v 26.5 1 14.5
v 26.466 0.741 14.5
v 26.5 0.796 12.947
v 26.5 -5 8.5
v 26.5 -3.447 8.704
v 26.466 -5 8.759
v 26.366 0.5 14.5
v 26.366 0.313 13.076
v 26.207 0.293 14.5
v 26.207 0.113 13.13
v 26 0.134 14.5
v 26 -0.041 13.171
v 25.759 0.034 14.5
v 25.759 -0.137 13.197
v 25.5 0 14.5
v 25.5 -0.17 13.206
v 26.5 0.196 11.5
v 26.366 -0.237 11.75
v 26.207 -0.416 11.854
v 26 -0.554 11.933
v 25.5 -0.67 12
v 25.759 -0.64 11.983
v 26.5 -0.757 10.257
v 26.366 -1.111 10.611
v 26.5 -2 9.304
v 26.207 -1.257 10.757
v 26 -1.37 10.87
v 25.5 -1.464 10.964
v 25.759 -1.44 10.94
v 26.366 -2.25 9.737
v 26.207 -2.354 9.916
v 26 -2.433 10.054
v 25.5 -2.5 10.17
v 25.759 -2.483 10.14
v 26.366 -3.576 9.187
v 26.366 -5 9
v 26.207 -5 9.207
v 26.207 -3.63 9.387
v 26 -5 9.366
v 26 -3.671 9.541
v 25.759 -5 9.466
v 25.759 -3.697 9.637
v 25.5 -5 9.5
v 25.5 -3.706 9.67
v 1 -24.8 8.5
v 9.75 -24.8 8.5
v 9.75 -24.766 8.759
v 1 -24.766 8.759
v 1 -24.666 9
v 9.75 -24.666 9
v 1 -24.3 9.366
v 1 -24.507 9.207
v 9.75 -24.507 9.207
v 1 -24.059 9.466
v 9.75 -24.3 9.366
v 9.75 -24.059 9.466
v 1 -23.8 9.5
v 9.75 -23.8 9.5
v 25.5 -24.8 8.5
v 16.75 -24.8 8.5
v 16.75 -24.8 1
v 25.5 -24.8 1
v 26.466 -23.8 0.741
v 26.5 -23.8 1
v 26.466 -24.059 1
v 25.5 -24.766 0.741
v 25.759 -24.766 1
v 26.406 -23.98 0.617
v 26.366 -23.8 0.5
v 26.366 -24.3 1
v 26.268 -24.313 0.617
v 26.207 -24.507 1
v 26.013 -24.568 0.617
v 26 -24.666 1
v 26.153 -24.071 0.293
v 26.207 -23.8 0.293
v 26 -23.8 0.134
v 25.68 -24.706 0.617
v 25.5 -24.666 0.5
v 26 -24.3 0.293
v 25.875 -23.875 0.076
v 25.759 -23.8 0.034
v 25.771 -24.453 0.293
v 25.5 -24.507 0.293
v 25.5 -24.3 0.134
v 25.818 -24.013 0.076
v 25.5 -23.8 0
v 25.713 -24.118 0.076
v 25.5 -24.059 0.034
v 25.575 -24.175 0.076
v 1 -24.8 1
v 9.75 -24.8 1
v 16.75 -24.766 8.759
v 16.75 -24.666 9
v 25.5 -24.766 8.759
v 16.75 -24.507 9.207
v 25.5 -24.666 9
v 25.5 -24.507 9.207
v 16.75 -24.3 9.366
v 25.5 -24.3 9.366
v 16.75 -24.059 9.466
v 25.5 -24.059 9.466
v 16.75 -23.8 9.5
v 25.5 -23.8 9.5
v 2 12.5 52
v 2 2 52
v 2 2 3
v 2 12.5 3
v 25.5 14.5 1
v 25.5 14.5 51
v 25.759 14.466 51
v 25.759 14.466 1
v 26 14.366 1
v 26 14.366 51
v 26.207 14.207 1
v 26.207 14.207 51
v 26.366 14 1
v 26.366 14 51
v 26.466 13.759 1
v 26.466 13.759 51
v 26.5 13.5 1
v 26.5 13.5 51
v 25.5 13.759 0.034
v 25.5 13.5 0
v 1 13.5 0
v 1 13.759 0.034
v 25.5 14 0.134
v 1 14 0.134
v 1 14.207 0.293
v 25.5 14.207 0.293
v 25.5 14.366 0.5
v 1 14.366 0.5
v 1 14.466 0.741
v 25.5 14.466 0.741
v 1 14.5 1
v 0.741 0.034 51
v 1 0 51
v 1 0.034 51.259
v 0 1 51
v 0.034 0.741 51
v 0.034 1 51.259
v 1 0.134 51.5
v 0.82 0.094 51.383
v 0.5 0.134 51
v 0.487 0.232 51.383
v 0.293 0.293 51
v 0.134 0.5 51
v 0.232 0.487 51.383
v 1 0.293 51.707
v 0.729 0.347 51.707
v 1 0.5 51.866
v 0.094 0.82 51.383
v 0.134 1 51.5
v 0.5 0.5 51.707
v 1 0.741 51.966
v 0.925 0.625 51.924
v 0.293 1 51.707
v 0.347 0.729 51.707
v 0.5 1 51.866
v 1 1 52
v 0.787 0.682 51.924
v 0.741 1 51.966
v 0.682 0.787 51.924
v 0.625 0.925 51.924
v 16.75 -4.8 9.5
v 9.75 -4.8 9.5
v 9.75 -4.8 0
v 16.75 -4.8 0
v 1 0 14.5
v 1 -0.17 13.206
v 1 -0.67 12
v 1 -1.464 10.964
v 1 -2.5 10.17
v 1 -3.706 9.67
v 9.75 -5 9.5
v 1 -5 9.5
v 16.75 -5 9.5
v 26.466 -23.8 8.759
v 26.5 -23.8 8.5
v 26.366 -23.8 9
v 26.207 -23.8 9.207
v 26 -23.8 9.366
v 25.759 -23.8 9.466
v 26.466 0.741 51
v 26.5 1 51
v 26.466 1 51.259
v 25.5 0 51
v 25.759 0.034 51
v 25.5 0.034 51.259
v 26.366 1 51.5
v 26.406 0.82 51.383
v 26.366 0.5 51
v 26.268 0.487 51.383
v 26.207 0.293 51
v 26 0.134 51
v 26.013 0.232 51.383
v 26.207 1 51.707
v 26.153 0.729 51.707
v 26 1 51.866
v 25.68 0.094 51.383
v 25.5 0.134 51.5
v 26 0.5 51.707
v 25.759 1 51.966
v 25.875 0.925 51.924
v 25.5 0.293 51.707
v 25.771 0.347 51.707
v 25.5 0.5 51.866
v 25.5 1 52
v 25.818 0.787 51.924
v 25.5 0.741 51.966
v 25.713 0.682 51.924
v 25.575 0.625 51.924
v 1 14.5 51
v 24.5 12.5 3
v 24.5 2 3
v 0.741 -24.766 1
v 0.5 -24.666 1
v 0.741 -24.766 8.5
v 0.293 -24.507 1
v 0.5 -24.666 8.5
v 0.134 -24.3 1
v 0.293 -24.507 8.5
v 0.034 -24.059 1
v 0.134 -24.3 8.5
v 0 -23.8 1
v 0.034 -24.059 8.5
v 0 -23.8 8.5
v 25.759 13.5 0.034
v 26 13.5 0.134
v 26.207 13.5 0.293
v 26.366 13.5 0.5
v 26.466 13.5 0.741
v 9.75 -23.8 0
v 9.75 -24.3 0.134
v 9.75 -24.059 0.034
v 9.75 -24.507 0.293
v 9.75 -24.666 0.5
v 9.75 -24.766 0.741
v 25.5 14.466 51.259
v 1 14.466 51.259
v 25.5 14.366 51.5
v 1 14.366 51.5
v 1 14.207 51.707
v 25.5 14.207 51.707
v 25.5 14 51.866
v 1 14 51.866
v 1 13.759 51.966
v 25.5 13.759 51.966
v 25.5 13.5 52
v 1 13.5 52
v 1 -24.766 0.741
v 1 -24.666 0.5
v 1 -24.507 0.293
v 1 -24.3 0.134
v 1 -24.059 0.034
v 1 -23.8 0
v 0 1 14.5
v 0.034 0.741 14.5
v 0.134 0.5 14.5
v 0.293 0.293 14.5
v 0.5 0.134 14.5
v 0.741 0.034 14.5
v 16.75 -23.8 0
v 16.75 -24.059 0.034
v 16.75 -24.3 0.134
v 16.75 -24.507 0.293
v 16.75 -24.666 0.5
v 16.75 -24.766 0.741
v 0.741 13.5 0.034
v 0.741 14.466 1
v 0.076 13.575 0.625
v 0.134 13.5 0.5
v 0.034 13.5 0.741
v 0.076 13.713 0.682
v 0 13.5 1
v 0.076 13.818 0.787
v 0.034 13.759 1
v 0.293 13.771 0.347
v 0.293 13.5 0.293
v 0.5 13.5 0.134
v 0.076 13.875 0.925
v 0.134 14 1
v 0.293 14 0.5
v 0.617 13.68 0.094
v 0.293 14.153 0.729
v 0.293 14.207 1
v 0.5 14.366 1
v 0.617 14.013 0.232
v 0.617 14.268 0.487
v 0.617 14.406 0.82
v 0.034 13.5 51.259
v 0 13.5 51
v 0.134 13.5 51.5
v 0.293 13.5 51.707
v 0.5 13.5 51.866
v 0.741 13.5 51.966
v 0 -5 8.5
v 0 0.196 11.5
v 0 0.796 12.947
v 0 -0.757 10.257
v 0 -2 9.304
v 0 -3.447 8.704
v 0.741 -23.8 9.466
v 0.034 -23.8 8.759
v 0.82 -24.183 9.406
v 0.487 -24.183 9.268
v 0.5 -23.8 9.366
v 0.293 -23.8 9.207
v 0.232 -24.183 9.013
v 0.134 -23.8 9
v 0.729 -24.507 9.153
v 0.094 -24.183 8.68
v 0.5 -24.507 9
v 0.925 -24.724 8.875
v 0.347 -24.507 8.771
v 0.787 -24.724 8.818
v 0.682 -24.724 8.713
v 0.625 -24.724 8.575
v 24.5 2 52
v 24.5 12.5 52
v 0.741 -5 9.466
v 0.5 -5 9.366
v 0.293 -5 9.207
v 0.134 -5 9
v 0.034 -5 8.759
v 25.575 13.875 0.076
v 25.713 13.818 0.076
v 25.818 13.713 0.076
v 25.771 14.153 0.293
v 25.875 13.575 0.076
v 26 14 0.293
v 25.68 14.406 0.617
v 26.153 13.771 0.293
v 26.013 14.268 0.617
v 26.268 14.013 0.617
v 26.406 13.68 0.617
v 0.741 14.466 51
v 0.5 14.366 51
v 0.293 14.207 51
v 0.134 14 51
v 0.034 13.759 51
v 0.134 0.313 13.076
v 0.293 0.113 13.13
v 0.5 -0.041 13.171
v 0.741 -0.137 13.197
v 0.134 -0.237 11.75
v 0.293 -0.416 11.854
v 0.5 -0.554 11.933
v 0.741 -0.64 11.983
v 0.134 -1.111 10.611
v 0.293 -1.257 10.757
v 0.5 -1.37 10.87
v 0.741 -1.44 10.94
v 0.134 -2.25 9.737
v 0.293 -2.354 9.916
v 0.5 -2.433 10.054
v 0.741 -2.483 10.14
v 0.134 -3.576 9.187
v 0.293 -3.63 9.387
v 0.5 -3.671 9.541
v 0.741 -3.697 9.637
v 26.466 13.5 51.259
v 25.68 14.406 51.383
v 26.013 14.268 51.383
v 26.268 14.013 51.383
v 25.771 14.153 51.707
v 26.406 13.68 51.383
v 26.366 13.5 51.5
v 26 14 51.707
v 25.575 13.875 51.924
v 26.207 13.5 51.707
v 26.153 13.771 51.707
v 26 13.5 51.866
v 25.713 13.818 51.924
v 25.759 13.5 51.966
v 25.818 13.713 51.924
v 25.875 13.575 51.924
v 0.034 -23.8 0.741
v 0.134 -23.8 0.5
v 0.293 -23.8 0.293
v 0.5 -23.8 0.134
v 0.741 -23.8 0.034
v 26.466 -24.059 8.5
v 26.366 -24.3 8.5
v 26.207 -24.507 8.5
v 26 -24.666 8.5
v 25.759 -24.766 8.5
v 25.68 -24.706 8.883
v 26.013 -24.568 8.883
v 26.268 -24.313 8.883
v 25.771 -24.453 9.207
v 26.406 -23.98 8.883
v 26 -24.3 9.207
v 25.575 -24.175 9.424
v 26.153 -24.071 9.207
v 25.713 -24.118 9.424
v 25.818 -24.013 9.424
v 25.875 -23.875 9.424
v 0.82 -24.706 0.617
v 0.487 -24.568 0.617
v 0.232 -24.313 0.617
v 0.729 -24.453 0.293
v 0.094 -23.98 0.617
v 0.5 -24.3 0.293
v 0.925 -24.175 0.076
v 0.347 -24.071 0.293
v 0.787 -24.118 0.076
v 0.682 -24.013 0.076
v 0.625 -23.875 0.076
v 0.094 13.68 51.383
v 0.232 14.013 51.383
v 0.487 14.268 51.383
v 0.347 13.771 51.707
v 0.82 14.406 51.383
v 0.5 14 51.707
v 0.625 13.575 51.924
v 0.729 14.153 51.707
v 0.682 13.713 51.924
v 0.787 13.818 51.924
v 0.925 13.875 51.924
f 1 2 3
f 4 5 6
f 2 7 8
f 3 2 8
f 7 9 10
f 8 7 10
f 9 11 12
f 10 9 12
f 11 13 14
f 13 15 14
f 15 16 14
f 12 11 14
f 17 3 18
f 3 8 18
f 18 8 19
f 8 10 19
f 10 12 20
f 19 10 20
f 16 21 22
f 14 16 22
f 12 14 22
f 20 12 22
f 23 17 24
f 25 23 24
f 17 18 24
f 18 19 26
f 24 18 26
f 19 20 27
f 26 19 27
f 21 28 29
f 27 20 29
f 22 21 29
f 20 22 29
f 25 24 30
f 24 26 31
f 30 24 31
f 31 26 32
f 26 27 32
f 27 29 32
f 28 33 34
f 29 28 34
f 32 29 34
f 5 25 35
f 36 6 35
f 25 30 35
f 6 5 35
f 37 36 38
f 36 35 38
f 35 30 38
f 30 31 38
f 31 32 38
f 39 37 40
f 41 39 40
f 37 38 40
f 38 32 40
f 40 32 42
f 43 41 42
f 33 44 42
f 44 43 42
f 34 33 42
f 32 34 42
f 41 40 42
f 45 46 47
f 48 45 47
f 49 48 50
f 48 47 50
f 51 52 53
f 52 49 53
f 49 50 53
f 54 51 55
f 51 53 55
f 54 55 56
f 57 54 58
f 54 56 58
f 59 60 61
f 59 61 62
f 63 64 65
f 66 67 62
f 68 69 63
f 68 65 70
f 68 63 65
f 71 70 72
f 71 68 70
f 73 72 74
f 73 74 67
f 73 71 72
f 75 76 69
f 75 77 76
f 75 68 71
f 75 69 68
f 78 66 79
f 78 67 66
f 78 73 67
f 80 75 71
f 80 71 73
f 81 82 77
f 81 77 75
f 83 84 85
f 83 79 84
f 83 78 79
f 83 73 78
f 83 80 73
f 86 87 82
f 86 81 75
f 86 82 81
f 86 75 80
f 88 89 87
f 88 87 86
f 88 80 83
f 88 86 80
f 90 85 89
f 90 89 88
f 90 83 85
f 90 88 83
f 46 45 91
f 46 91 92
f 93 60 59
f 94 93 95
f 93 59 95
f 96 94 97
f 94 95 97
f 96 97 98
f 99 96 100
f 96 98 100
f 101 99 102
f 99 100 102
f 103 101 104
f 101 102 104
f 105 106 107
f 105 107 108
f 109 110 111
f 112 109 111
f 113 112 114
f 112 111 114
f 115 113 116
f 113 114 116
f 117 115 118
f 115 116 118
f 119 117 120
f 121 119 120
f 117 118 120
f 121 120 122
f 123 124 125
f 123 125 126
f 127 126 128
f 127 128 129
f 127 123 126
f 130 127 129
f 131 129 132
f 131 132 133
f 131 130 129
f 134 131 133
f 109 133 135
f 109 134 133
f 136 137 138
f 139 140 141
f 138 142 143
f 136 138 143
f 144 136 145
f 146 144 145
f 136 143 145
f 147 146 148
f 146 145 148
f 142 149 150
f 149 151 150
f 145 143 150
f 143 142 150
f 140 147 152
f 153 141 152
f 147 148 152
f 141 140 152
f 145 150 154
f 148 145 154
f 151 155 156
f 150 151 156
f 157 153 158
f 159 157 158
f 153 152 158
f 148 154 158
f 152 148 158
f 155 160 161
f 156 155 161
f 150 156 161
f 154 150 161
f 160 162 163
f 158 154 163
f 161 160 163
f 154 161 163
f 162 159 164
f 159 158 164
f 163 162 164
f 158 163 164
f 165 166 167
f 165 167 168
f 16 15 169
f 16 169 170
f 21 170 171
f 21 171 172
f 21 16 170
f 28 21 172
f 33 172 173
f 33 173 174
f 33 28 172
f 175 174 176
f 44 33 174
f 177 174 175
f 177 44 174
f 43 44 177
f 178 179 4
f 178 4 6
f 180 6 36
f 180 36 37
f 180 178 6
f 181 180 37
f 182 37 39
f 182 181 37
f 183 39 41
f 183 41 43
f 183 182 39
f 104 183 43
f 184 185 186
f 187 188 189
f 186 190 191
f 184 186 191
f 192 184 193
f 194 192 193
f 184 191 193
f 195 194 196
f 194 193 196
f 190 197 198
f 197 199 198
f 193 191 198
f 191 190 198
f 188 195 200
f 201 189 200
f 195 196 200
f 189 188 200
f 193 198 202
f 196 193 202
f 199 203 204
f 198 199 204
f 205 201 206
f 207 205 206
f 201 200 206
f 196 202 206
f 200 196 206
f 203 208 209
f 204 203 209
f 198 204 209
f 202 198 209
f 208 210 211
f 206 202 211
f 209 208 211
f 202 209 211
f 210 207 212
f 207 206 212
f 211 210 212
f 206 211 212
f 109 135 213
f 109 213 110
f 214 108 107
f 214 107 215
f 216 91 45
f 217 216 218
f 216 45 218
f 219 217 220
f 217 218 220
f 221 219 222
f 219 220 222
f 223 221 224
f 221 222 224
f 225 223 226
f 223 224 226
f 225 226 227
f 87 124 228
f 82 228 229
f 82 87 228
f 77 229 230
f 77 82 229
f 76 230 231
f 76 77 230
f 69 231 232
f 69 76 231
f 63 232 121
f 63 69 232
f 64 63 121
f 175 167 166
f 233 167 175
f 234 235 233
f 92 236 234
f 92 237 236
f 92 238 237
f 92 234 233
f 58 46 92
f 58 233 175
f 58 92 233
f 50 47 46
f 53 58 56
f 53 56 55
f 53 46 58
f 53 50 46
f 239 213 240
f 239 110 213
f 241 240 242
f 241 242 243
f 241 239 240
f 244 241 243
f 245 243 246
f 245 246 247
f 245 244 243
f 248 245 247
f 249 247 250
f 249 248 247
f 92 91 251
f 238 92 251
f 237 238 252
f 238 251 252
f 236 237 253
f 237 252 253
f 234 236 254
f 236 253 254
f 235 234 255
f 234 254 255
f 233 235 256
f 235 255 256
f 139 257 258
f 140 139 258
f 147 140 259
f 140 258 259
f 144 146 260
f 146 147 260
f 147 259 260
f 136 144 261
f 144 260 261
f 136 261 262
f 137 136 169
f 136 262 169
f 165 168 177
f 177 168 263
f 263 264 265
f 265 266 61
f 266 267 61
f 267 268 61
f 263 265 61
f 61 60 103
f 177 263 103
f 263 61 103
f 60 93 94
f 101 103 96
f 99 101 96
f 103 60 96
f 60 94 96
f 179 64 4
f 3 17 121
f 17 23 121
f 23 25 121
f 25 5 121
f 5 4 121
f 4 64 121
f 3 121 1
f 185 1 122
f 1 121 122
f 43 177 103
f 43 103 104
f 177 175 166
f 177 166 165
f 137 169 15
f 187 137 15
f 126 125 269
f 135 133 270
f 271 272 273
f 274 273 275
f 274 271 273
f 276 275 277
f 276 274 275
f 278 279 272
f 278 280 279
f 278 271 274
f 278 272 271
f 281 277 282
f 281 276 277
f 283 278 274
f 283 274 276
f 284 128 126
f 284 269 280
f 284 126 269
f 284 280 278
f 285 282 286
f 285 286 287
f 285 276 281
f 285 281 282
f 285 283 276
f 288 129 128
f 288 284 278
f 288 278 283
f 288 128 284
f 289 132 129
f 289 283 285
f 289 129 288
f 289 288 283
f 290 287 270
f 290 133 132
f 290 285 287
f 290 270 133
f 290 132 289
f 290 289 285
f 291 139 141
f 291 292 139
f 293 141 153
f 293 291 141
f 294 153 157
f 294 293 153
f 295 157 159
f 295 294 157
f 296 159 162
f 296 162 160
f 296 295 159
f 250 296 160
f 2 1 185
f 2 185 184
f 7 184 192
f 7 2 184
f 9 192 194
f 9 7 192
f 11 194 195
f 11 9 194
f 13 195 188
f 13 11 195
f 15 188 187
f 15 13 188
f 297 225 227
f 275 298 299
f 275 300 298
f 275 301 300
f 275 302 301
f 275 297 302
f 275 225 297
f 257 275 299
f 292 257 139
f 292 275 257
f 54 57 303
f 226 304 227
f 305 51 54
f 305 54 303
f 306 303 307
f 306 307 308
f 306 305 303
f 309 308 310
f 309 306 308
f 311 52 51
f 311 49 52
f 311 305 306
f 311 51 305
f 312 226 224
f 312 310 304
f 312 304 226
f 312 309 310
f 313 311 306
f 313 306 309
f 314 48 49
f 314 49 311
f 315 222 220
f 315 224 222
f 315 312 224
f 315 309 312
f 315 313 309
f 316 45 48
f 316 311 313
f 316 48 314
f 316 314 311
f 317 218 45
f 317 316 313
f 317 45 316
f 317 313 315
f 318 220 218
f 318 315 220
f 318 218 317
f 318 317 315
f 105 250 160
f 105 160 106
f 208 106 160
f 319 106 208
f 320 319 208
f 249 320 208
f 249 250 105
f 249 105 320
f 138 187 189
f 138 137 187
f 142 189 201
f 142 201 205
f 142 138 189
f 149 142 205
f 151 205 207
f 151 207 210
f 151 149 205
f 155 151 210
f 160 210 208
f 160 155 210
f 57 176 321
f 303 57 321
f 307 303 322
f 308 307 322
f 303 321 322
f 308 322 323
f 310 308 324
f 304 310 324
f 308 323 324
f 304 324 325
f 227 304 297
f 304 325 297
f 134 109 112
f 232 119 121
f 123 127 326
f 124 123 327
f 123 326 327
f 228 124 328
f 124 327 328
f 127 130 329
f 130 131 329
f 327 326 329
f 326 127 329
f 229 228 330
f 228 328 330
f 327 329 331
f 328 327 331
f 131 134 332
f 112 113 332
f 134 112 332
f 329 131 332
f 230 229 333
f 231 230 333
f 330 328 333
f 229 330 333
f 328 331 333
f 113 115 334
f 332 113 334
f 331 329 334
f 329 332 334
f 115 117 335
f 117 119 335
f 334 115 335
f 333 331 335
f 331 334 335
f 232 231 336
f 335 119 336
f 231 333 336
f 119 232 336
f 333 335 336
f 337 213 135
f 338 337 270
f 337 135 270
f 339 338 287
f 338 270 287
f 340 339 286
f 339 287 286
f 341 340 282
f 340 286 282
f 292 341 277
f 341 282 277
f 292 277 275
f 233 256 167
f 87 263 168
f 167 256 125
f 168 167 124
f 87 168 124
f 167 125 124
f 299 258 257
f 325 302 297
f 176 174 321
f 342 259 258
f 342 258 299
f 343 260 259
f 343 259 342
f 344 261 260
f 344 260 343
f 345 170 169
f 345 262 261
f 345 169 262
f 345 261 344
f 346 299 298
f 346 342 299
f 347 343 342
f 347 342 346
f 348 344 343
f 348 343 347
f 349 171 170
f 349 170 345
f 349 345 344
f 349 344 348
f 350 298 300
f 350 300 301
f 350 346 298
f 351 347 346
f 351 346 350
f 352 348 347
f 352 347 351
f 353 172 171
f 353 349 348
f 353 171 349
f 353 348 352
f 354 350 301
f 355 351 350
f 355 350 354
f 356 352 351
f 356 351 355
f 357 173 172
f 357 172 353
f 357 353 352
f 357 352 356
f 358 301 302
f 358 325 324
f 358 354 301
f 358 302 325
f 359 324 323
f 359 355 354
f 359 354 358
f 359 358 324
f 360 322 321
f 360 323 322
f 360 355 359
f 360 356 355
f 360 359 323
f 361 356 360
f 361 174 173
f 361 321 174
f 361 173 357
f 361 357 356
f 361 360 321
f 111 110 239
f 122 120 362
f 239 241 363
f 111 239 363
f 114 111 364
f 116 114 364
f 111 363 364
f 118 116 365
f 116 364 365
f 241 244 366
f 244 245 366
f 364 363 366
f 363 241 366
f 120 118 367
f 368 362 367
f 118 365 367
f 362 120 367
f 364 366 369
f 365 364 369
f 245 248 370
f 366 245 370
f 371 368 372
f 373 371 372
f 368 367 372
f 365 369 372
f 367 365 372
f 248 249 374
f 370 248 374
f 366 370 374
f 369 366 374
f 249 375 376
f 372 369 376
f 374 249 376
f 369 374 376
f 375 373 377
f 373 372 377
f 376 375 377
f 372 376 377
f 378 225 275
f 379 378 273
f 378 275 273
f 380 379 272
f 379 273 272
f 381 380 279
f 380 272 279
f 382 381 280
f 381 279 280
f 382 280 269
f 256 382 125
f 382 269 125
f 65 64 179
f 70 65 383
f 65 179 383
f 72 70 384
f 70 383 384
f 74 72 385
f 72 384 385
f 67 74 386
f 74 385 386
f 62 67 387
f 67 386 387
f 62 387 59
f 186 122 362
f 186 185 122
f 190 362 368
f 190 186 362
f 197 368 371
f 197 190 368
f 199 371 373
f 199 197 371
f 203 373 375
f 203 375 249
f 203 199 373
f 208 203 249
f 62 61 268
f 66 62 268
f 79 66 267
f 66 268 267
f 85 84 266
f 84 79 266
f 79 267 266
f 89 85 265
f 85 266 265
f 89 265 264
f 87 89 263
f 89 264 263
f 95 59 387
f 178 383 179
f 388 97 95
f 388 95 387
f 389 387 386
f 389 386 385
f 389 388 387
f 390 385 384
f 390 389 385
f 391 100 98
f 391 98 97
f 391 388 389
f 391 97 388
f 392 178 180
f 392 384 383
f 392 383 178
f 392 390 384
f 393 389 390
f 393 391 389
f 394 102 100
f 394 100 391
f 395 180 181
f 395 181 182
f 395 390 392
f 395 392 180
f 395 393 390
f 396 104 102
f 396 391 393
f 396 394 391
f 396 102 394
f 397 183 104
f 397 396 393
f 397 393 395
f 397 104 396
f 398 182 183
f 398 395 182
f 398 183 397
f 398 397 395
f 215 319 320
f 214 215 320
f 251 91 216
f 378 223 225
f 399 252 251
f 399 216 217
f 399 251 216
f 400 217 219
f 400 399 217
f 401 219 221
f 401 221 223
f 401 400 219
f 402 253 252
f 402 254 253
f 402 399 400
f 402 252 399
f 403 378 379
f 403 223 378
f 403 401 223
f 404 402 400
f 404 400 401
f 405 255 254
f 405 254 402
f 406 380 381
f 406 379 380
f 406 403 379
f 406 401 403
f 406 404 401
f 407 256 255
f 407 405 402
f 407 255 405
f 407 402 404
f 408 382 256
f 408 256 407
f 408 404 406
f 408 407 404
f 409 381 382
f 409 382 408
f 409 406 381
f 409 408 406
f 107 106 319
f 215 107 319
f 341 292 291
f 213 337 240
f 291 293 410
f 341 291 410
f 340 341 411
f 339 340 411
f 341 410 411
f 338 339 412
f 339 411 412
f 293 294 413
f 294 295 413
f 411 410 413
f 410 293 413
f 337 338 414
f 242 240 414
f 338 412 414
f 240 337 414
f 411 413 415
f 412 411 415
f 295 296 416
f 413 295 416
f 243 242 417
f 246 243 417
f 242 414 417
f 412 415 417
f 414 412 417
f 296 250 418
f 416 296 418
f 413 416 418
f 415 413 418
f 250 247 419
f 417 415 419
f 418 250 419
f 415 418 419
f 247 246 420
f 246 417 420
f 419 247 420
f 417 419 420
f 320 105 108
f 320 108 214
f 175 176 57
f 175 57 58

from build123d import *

# Parameters (mm, degrees)
SKETCH_2_W          = 26.5
SKETCH_2_H          = 14.5
EXTRUDE_1_DEPTH     = 52
SKETCH_6_W          = 22.5
SKETCH_6_H          = 10.5
CUT_EXTRUDE_1_DEPTH = 49
SKETCH_7_W          = 26.5
SKETCH_7_H          = 9.5
EXTRUDE_2_DEPTH     = 24.8
FILLET_1_R          = 5
FILLET_2_R          = 1
FILLET_4_R          = 1
FILLET_5_R          = 1
FILLET_6_R          = 1
SKETCH_8_W          = 7
SKETCH_8_H          = 9.5
CUT_EXTRUDE_2_DEPTH = 20


with BuildPart() as part:
    # ｽｹｯﾁ2 → ﾎﾞｽ - 押し出し1 (new body)
    with BuildSketch(Plane.XY):
        with Locations((13.25, 7.25)):
            Rectangle(SKETCH_2_W, SKETCH_2_H)
    extrude(amount=EXTRUDE_1_DEPTH)

    # ｽｹｯﾁ6 → ｶｯﾄ - 押し出し1 (cut)
    with BuildSketch(Plane.XY.offset(52)):
        with Locations((13.25, 7.25)):
            Rectangle(SKETCH_6_W, SKETCH_6_H)
    extrude(amount=-CUT_EXTRUDE_1_DEPTH, mode=Mode.SUBTRACT)

    # ｽｹｯﾁ7 → ﾎﾞｽ - 押し出し2 (add)
    with BuildSketch(Plane.XZ):
        with Locations((13.25, 4.75)):
            Rectangle(SKETCH_7_W, SKETCH_7_H)
    extrude(amount=EXTRUDE_2_DEPTH)

    # ﾌｨﾚｯﾄ1
    fillet_1_edges = [part.edges().sort_by_distance(p)[0] for p in [
        (13.25, 0, 9.5),
    ]]
    fillet(fillet_1_edges, radius=FILLET_1_R)

    # ﾌｨﾚｯﾄ2
    fillet_2_edges = [part.edges().sort_by_distance(p)[0] for p in [
        (26.5, 14.5, 26),
    ]]
    fillet(fillet_2_edges, radius=FILLET_2_R)

    # ﾌｨﾚｯﾄ4
    fillet_4_edges = [part.edges().sort_by_distance(p)[0] for p in [
        (26.5, -14.9, 9.5),
        (26.5, -24.8, 4.75),
        (26.5, -1.464466094, 10.964466094),
        (12.75, 14.5, 0),
        (26.207106781, 14.207106781, 0),
        (26.5, -5.65, 0),
        (26.5, 0, 33.25),
    ]]
    fillet(fillet_4_edges, radius=FILLET_4_R)

    # ﾌｨﾚｯﾄ5
    # the kernel refuses this fillet: 1 mm, written as the material it takes off along each edge
    with BuildSketch(Plane(origin=(25.5, -23.8, 8.5), x_dir=(0, -1, 0), z_dir=(0, 0, 1))) as fillet_5_piece_1_section:
        Polygon((0, 0), (FILLET_5_R, 0), (FILLET_5_R, FILLET_5_R), (0, FILLET_5_R), align=None)
    fillet_5_piece_1 = extrude(amount=FILLET_5_R, mode=Mode.PRIVATE)
    fillet_5_piece_1 = fillet_5_piece_1 - Plane(origin=(25.5, -23.8, 8.5), x_dir=(-0.7071067811865475, 0.7071067811865475, 0), z_dir=(0, 0, 1)) * Sphere(FILLET_5_R, mode=Mode.PRIVATE)
    add(fillet_5_piece_1, mode=Mode.SUBTRACT)
    with BuildSketch(Plane(origin=(25.5, -23.8, 1), x_dir=(0, -1, 0), z_dir=(0, 0, -1))) as fillet_5_piece_2_section:
        Polygon((0, 0), (FILLET_5_R, 0), (FILLET_5_R, -FILLET_5_R), (0, -FILLET_5_R), align=None)
    fillet_5_piece_2 = extrude(amount=FILLET_5_R, mode=Mode.PRIVATE)
    fillet_5_piece_2 = fillet_5_piece_2 - Plane(origin=(25.5, -23.8, 1), x_dir=(-0.7071067811865475, 0.7071067811865475, 0), z_dir=(0, 0, -1)) * Sphere(FILLET_5_R, mode=Mode.PRIVATE)
    add(fillet_5_piece_2, mode=Mode.SUBTRACT)
    with BuildSketch(Plane(origin=(1, -23.8, 8.5), x_dir=(-1, 0, 0), z_dir=(0, -1, 0))) as fillet_5_piece_3_section:
        Polygon((0, 0), (FILLET_5_R, 0), (FILLET_5_R, -FILLET_5_R), (0, -FILLET_5_R), align=None)
    fillet_5_piece_3 = extrude(amount=FILLET_5_R, mode=Mode.PRIVATE)
    fillet_5_piece_3 = fillet_5_piece_3 - Plane(origin=(1, -23.8, 8.5), x_dir=(0.7071067811865475, 0, -0.7071067811865475), z_dir=(0, -1, 0)) * Sphere(FILLET_5_R, mode=Mode.PRIVATE)
    add(fillet_5_piece_3, mode=Mode.SUBTRACT)
    with BuildSketch(Plane(origin=(1, -23.8, 1), x_dir=(-1, 0, 0), z_dir=(0, 0, -1))) as fillet_5_piece_4_section:
        Polygon((0, 0), (FILLET_5_R, 0), (FILLET_5_R, -FILLET_5_R), (0, -FILLET_5_R), align=None)
    fillet_5_piece_4 = extrude(amount=FILLET_5_R, mode=Mode.PRIVATE)
    fillet_5_piece_4 = fillet_5_piece_4 - Plane(origin=(1, -23.8, 1), x_dir=(0.7071067811865475, 0.7071067811865475, 0), z_dir=(0, 0, -1)) * Sphere(FILLET_5_R, mode=Mode.PRIVATE)
    add(fillet_5_piece_4, mode=Mode.SUBTRACT)
    with BuildSketch(Plane(origin=(0, -5, 9.5), x_dir=(0, 0, -1), z_dir=(0, -1, 0))) as fillet_5_piece_5:
        with BuildLine():
            CenterArc((FILLET_5_R, FILLET_5_R), FILLET_5_R, 180, 90)
            Line((0, FILLET_5_R), (0, 0))
            Line((0, 0), (FILLET_5_R, 0))
        make_face()
    extrude(amount=18.8, mode=Mode.SUBTRACT)
    with BuildSketch(Plane(origin=(0, -24.8, 8.5), x_dir=(0, 1, 0), z_dir=(0, 0, -1))) as fillet_5_piece_6:
        with BuildLine():
            CenterArc((FILLET_5_R, FILLET_5_R), FILLET_5_R, 180, 90)
            Line((0, FILLET_5_R), (0, 0))
            Line((0, 0), (FILLET_5_R, 0))
        make_face()
    extrude(amount=7.5, mode=Mode.SUBTRACT)
    with BuildSketch(Plane(origin=(1, -24.8, 0), x_dir=(0, 1, 0), z_dir=(1, 0, 0)), Plane(origin=(25.5, -24.8, 9.5), x_dir=(0, 1, 0), z_dir=(-1, 0, 0))) as fillet_5_piece_7:
        with BuildLine():
            CenterArc((FILLET_5_R, FILLET_5_R), FILLET_5_R, 180, 90)
            Line((0, FILLET_5_R), (0, 0))
            Line((0, 0), (FILLET_5_R, 0))
        make_face()
    extrude(amount=24.5, mode=Mode.SUBTRACT)
    with BuildSketch(Plane(origin=(0, -5, 14.5), x_dir=(0, 1, 0), z_dir=(0, 0, 1))) as fillet_5_piece_8:
        with BuildLine():
            CenterArc((5 + FILLET_5_R, -FILLET_5_R), FILLET_5_R, 90, 90)
            Line((5, -FILLET_5_R), (5, 0))
            Line((5, 0), (5 + FILLET_5_R, 0))
        make_face()
    revolve(axis=Axis((0, -5, 14.5), (-1, 0, 0)), revolution_arc=90, mode=Mode.SUBTRACT)
    with BuildSketch(Plane(origin=(0, 13.5, 0), x_dir=(0, 0, 1), z_dir=(0, -1, 0))) as fillet_5_piece_9:
        with BuildLine():
            CenterArc((FILLET_5_R, -FILLET_5_R), FILLET_5_R, 90, 90)
            Line((0, -FILLET_5_R), (0, 0))
            Line((0, 0), (FILLET_5_R, 0))
        make_face()
    extrude(amount=37.3, mode=Mode.SUBTRACT)
    with BuildSketch(Plane(origin=(0, 13.5, 1), x_dir=(0, 0, -1), z_dir=(0, -1, 0))) as fillet_5_piece_10:
        with BuildLine():
            CenterArc((1 - FILLET_5_R, FILLET_5_R), FILLET_5_R, 270, 90)
            Line((1, FILLET_5_R), (1, 0))
            Line((1, 0), (1 - FILLET_5_R, 0))
        make_face()
    revolve(axis=Axis((0, 13.5, 1), (1, 0, 0)), revolution_arc=90, mode=Mode.SUBTRACT)
    with BuildSketch(Plane(origin=(0, 14.5, 1), x_dir=(1, 0, 0), z_dir=(0, 0, 1))) as fillet_5_piece_11:
        with BuildLine():
            CenterArc((FILLET_5_R, -FILLET_5_R), FILLET_5_R, 90, 90)
            Line((0, -FILLET_5_R), (0, 0))
            Line((0, 0), (FILLET_5_R, 0))
        make_face()
    extrude(amount=53.5, mode=Mode.SUBTRACT)
    with BuildSketch(Plane(origin=(0, 0, 14.5), x_dir=(1, 0, 0), z_dir=(0, 0, 1))) as fillet_5_piece_12:
        with BuildLine():
            CenterArc((FILLET_5_R, FILLET_5_R), FILLET_5_R, 180, 90)
            Line((0, FILLET_5_R), (0, 0))
            Line((0, 0), (FILLET_5_R, 0))
        make_face()
    extrude(amount=40, mode=Mode.SUBTRACT)

    # ﾌｨﾚｯﾄ6
    fillet_6_edges = [part.edges().sort_by_distance(p)[0] for p in [
        (13.25, 14.5, 52),
        (26.207106781, 14.207106781, 52),
        (26.5, 7.25, 52),
        (26.207106781, 0.292893219, 52),
        (0, 7.25, 52),
        (13.25, 0, 52),
        (0.292893219, 0.292893219, 52),
        (0.292893219, 14.207106781, 52),
    ]]
    fillet(fillet_6_edges, radius=FILLET_6_R)

    # ｽｹｯﾁ8 → ｶｯﾄ - 押し出し2 (cut)
    with BuildSketch(Plane.XZ.offset(24.8)):
        with Locations((13.25, 4.75)):
            Rectangle(SKETCH_8_W, SKETCH_8_H)
    extrude(amount=-CUT_EXTRUDE_2_DEPTH, mode=Mode.SUBTRACT)


solid = part.part
